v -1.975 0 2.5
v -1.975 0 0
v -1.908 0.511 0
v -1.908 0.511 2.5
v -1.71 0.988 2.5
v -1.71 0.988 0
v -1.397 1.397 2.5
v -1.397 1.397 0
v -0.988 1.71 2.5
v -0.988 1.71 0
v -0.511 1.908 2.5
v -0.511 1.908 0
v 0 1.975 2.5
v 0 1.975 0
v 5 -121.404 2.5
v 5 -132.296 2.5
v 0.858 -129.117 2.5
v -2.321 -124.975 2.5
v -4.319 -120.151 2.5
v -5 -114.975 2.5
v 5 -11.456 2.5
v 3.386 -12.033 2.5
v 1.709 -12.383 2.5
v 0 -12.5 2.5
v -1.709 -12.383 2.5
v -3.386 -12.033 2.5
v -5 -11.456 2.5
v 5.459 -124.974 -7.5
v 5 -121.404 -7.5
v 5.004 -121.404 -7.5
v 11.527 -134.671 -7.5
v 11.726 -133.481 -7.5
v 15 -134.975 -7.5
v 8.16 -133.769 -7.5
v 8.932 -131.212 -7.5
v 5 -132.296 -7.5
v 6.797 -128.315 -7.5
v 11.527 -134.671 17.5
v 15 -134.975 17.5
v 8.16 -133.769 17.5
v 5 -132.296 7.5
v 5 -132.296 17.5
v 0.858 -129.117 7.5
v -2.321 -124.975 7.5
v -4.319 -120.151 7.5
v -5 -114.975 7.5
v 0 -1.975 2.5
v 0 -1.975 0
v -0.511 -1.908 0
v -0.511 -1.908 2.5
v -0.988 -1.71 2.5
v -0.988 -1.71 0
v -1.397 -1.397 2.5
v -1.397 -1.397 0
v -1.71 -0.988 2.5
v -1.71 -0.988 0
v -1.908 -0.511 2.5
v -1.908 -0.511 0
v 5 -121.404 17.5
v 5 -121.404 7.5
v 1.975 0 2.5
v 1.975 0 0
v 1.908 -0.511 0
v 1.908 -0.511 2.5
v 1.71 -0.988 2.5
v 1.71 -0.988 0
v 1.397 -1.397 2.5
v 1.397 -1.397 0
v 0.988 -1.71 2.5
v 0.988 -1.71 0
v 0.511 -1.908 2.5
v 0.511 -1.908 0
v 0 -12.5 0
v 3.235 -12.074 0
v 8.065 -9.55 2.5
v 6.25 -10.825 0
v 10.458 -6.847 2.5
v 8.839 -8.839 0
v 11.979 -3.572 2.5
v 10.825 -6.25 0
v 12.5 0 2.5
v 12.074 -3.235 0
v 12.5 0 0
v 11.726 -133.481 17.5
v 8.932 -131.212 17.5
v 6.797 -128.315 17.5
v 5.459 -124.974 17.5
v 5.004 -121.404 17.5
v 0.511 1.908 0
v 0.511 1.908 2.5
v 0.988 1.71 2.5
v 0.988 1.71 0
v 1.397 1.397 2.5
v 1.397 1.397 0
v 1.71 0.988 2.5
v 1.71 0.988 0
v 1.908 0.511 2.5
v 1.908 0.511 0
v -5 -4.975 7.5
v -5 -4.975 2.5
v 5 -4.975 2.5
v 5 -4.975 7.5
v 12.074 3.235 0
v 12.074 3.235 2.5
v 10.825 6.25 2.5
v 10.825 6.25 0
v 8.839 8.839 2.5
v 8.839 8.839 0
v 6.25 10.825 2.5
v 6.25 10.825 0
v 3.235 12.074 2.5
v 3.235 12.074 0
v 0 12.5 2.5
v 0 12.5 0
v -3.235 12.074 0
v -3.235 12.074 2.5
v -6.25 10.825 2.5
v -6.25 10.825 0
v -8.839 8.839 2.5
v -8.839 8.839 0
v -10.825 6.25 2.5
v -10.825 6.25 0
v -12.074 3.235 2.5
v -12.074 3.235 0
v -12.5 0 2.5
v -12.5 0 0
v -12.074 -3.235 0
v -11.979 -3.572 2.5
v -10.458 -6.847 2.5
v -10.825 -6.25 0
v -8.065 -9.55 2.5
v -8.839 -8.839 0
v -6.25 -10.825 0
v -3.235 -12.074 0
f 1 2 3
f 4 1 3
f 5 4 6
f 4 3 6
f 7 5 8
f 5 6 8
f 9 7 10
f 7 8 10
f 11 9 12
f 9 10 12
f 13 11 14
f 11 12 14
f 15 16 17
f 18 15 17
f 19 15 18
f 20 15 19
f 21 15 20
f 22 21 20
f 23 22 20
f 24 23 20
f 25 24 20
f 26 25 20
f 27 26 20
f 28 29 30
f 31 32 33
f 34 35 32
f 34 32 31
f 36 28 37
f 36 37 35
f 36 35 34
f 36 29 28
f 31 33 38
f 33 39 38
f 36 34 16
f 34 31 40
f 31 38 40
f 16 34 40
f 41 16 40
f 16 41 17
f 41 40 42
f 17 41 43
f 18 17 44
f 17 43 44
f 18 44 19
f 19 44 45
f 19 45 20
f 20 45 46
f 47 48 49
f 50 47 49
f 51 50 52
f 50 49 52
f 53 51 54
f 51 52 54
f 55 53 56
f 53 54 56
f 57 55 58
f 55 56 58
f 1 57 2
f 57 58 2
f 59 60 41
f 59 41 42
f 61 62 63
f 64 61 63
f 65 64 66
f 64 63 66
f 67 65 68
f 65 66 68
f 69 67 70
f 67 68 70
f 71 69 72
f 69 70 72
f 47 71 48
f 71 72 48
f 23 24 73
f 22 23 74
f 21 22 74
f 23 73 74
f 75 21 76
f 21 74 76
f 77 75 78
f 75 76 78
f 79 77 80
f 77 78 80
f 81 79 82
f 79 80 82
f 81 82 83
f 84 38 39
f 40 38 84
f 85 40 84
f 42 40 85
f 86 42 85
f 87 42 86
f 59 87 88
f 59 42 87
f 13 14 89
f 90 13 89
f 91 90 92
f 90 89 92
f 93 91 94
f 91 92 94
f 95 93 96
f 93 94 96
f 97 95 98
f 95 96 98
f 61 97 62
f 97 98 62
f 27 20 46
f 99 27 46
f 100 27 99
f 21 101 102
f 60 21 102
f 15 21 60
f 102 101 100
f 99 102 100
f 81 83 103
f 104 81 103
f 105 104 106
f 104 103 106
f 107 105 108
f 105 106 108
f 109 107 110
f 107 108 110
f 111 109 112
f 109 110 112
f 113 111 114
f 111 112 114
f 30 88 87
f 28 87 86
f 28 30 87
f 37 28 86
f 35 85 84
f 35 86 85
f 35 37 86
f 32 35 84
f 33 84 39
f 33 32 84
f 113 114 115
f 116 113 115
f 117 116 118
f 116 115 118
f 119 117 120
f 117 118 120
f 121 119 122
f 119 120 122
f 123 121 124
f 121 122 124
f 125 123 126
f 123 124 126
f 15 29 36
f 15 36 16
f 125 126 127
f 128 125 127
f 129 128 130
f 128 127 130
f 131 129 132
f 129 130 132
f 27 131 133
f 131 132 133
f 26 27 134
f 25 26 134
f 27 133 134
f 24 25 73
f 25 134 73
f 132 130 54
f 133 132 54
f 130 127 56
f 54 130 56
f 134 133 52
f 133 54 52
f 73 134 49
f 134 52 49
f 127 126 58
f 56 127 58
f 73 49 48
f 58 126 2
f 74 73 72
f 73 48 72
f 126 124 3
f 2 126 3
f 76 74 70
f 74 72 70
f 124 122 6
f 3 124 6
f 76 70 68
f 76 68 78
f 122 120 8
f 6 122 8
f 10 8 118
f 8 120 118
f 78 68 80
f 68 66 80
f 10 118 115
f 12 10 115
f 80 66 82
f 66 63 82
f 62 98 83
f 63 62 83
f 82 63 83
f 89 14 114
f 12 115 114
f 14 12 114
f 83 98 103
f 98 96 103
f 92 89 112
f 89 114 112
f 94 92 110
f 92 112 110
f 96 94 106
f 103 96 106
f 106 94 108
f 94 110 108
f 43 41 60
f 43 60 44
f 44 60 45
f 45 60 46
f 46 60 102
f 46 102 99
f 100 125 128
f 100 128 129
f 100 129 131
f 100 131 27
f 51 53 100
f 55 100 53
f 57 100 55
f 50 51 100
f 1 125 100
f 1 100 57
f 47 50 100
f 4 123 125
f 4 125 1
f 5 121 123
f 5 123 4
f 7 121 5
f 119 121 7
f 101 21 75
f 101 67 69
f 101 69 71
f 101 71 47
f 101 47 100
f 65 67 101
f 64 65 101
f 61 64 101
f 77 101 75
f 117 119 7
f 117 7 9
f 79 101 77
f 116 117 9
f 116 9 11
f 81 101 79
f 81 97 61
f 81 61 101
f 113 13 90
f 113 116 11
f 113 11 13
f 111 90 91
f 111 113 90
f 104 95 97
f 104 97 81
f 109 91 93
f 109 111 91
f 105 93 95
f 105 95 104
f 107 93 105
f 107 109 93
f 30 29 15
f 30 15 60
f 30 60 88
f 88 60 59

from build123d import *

# Parameters (mm, degrees)
BOSS_EXTRUDE5_DEPTH  = 2.5
BOSS_EXTRUDE6_DEPTH  = 5
BOSS_EXTRUDE10_DEPTH = 10
CUT_EXTRUDE2_DEPTH   = 139.087836629
FILLET2_R            = 20


with BuildPart() as part:
    # Sketch3 → Boss-Extrude5 (new body)
    with BuildSketch(Plane.XY):
        with BuildLine():
            ThreePointArc((0, 1.975), (1.396535893, 1.396535893), (1.975, 0))
            Line((1.975, 0), (12.5, 0))
            ThreePointArc((12.5, 0), (8.838834765, 8.838834765), (0, 12.5))
            Line((0, 12.5), (0, 1.975))
        make_face()
        with BuildLine():
            Line((12.5, 0), (1.975, 0))
            ThreePointArc((1.975, 0), (1.396535893, -1.396535893), (0, -1.975))
            Line((0, -1.975), (0, -12.5))
            ThreePointArc((0, -12.5), (8.838834765, -8.838834765), (12.5, 0))
        make_face()
        with BuildLine():
            ThreePointArc((0, -1.975), (-1.396535893, -1.396535893), (-1.975, 0))
            Line((-1.975, 0), (-12.5, 0))
            ThreePointArc((-12.5, 0), (-8.838834765, -8.838834765), (0, -12.5))
            Line((0, -12.5), (0, -1.975))
        make_face()
        with BuildLine():
            Line((-12.5, 0), (-1.975, 0))
            ThreePointArc((-1.975, 0), (-1.396535893, 1.396535893), (0, 1.975))
            Line((0, 1.975), (0, 12.5))
            ThreePointArc((0, 12.5), (-8.838834765, 8.838834765), (-12.5, 0))
        make_face()
    extrude(amount=BOSS_EXTRUDE5_DEPTH)

    # Sketch5 → Boss-Extrude6 (add)
    with BuildSketch(Plane.XY.offset(2.5)):
        Polygon((-5, -134.975), (-5, -4.975), (0, -4.975), (5, -4.975), (5, -134.975), align=None)
    extrude(amount=BOSS_EXTRUDE6_DEPTH)

    # Sketch13 → Boss-Extrude10 (add)
    with BuildSketch(Plane(origin=(5, 0, 0), x_dir=(0, 0, -1), z_dir=(1, 0, 0))):
        Polygon((-7.5, -134.975), (-17.5, -134.975), (-17.5, -121.403681616), (-7.5, -121.403681616), (-2.5, -121.403681616), (7.5, -121.403681616), (7.5, -134.975), (-2.5, -134.975), align=None)
    extrude(amount=BOSS_EXTRUDE10_DEPTH)

    # Sketch14 → Cut-Extrude2 (cut, through all)
    with BuildSketch(Plane(origin=(0, 0, -7.5), x_dir=(-1, 0, 0), z_dir=(0, 0, -1))):
        with BuildLine():
            Line((-15, -134.975), (-15, -121.403681616))
            Line((-15, -121.403681616), (-5.003644464, -121.4036816))
            ThreePointArc((-5.003644464, -121.4036816), (-7.772477519, -129.831430515), (-15, -134.975))
        make_face()
    extrude(amount=-CUT_EXTRUDE2_DEPTH, mode=Mode.SUBTRACT)

    # Fillet2
    fillet2_edges = [part.edges().sort_by_distance(p)[0] for p in [
        (-5, -134.975, 5),
    ]]
    fillet(fillet2_edges, radius=FILLET2_R - 0.0001)  # a hair under: the kernel refuses the full size


solid = part.part
